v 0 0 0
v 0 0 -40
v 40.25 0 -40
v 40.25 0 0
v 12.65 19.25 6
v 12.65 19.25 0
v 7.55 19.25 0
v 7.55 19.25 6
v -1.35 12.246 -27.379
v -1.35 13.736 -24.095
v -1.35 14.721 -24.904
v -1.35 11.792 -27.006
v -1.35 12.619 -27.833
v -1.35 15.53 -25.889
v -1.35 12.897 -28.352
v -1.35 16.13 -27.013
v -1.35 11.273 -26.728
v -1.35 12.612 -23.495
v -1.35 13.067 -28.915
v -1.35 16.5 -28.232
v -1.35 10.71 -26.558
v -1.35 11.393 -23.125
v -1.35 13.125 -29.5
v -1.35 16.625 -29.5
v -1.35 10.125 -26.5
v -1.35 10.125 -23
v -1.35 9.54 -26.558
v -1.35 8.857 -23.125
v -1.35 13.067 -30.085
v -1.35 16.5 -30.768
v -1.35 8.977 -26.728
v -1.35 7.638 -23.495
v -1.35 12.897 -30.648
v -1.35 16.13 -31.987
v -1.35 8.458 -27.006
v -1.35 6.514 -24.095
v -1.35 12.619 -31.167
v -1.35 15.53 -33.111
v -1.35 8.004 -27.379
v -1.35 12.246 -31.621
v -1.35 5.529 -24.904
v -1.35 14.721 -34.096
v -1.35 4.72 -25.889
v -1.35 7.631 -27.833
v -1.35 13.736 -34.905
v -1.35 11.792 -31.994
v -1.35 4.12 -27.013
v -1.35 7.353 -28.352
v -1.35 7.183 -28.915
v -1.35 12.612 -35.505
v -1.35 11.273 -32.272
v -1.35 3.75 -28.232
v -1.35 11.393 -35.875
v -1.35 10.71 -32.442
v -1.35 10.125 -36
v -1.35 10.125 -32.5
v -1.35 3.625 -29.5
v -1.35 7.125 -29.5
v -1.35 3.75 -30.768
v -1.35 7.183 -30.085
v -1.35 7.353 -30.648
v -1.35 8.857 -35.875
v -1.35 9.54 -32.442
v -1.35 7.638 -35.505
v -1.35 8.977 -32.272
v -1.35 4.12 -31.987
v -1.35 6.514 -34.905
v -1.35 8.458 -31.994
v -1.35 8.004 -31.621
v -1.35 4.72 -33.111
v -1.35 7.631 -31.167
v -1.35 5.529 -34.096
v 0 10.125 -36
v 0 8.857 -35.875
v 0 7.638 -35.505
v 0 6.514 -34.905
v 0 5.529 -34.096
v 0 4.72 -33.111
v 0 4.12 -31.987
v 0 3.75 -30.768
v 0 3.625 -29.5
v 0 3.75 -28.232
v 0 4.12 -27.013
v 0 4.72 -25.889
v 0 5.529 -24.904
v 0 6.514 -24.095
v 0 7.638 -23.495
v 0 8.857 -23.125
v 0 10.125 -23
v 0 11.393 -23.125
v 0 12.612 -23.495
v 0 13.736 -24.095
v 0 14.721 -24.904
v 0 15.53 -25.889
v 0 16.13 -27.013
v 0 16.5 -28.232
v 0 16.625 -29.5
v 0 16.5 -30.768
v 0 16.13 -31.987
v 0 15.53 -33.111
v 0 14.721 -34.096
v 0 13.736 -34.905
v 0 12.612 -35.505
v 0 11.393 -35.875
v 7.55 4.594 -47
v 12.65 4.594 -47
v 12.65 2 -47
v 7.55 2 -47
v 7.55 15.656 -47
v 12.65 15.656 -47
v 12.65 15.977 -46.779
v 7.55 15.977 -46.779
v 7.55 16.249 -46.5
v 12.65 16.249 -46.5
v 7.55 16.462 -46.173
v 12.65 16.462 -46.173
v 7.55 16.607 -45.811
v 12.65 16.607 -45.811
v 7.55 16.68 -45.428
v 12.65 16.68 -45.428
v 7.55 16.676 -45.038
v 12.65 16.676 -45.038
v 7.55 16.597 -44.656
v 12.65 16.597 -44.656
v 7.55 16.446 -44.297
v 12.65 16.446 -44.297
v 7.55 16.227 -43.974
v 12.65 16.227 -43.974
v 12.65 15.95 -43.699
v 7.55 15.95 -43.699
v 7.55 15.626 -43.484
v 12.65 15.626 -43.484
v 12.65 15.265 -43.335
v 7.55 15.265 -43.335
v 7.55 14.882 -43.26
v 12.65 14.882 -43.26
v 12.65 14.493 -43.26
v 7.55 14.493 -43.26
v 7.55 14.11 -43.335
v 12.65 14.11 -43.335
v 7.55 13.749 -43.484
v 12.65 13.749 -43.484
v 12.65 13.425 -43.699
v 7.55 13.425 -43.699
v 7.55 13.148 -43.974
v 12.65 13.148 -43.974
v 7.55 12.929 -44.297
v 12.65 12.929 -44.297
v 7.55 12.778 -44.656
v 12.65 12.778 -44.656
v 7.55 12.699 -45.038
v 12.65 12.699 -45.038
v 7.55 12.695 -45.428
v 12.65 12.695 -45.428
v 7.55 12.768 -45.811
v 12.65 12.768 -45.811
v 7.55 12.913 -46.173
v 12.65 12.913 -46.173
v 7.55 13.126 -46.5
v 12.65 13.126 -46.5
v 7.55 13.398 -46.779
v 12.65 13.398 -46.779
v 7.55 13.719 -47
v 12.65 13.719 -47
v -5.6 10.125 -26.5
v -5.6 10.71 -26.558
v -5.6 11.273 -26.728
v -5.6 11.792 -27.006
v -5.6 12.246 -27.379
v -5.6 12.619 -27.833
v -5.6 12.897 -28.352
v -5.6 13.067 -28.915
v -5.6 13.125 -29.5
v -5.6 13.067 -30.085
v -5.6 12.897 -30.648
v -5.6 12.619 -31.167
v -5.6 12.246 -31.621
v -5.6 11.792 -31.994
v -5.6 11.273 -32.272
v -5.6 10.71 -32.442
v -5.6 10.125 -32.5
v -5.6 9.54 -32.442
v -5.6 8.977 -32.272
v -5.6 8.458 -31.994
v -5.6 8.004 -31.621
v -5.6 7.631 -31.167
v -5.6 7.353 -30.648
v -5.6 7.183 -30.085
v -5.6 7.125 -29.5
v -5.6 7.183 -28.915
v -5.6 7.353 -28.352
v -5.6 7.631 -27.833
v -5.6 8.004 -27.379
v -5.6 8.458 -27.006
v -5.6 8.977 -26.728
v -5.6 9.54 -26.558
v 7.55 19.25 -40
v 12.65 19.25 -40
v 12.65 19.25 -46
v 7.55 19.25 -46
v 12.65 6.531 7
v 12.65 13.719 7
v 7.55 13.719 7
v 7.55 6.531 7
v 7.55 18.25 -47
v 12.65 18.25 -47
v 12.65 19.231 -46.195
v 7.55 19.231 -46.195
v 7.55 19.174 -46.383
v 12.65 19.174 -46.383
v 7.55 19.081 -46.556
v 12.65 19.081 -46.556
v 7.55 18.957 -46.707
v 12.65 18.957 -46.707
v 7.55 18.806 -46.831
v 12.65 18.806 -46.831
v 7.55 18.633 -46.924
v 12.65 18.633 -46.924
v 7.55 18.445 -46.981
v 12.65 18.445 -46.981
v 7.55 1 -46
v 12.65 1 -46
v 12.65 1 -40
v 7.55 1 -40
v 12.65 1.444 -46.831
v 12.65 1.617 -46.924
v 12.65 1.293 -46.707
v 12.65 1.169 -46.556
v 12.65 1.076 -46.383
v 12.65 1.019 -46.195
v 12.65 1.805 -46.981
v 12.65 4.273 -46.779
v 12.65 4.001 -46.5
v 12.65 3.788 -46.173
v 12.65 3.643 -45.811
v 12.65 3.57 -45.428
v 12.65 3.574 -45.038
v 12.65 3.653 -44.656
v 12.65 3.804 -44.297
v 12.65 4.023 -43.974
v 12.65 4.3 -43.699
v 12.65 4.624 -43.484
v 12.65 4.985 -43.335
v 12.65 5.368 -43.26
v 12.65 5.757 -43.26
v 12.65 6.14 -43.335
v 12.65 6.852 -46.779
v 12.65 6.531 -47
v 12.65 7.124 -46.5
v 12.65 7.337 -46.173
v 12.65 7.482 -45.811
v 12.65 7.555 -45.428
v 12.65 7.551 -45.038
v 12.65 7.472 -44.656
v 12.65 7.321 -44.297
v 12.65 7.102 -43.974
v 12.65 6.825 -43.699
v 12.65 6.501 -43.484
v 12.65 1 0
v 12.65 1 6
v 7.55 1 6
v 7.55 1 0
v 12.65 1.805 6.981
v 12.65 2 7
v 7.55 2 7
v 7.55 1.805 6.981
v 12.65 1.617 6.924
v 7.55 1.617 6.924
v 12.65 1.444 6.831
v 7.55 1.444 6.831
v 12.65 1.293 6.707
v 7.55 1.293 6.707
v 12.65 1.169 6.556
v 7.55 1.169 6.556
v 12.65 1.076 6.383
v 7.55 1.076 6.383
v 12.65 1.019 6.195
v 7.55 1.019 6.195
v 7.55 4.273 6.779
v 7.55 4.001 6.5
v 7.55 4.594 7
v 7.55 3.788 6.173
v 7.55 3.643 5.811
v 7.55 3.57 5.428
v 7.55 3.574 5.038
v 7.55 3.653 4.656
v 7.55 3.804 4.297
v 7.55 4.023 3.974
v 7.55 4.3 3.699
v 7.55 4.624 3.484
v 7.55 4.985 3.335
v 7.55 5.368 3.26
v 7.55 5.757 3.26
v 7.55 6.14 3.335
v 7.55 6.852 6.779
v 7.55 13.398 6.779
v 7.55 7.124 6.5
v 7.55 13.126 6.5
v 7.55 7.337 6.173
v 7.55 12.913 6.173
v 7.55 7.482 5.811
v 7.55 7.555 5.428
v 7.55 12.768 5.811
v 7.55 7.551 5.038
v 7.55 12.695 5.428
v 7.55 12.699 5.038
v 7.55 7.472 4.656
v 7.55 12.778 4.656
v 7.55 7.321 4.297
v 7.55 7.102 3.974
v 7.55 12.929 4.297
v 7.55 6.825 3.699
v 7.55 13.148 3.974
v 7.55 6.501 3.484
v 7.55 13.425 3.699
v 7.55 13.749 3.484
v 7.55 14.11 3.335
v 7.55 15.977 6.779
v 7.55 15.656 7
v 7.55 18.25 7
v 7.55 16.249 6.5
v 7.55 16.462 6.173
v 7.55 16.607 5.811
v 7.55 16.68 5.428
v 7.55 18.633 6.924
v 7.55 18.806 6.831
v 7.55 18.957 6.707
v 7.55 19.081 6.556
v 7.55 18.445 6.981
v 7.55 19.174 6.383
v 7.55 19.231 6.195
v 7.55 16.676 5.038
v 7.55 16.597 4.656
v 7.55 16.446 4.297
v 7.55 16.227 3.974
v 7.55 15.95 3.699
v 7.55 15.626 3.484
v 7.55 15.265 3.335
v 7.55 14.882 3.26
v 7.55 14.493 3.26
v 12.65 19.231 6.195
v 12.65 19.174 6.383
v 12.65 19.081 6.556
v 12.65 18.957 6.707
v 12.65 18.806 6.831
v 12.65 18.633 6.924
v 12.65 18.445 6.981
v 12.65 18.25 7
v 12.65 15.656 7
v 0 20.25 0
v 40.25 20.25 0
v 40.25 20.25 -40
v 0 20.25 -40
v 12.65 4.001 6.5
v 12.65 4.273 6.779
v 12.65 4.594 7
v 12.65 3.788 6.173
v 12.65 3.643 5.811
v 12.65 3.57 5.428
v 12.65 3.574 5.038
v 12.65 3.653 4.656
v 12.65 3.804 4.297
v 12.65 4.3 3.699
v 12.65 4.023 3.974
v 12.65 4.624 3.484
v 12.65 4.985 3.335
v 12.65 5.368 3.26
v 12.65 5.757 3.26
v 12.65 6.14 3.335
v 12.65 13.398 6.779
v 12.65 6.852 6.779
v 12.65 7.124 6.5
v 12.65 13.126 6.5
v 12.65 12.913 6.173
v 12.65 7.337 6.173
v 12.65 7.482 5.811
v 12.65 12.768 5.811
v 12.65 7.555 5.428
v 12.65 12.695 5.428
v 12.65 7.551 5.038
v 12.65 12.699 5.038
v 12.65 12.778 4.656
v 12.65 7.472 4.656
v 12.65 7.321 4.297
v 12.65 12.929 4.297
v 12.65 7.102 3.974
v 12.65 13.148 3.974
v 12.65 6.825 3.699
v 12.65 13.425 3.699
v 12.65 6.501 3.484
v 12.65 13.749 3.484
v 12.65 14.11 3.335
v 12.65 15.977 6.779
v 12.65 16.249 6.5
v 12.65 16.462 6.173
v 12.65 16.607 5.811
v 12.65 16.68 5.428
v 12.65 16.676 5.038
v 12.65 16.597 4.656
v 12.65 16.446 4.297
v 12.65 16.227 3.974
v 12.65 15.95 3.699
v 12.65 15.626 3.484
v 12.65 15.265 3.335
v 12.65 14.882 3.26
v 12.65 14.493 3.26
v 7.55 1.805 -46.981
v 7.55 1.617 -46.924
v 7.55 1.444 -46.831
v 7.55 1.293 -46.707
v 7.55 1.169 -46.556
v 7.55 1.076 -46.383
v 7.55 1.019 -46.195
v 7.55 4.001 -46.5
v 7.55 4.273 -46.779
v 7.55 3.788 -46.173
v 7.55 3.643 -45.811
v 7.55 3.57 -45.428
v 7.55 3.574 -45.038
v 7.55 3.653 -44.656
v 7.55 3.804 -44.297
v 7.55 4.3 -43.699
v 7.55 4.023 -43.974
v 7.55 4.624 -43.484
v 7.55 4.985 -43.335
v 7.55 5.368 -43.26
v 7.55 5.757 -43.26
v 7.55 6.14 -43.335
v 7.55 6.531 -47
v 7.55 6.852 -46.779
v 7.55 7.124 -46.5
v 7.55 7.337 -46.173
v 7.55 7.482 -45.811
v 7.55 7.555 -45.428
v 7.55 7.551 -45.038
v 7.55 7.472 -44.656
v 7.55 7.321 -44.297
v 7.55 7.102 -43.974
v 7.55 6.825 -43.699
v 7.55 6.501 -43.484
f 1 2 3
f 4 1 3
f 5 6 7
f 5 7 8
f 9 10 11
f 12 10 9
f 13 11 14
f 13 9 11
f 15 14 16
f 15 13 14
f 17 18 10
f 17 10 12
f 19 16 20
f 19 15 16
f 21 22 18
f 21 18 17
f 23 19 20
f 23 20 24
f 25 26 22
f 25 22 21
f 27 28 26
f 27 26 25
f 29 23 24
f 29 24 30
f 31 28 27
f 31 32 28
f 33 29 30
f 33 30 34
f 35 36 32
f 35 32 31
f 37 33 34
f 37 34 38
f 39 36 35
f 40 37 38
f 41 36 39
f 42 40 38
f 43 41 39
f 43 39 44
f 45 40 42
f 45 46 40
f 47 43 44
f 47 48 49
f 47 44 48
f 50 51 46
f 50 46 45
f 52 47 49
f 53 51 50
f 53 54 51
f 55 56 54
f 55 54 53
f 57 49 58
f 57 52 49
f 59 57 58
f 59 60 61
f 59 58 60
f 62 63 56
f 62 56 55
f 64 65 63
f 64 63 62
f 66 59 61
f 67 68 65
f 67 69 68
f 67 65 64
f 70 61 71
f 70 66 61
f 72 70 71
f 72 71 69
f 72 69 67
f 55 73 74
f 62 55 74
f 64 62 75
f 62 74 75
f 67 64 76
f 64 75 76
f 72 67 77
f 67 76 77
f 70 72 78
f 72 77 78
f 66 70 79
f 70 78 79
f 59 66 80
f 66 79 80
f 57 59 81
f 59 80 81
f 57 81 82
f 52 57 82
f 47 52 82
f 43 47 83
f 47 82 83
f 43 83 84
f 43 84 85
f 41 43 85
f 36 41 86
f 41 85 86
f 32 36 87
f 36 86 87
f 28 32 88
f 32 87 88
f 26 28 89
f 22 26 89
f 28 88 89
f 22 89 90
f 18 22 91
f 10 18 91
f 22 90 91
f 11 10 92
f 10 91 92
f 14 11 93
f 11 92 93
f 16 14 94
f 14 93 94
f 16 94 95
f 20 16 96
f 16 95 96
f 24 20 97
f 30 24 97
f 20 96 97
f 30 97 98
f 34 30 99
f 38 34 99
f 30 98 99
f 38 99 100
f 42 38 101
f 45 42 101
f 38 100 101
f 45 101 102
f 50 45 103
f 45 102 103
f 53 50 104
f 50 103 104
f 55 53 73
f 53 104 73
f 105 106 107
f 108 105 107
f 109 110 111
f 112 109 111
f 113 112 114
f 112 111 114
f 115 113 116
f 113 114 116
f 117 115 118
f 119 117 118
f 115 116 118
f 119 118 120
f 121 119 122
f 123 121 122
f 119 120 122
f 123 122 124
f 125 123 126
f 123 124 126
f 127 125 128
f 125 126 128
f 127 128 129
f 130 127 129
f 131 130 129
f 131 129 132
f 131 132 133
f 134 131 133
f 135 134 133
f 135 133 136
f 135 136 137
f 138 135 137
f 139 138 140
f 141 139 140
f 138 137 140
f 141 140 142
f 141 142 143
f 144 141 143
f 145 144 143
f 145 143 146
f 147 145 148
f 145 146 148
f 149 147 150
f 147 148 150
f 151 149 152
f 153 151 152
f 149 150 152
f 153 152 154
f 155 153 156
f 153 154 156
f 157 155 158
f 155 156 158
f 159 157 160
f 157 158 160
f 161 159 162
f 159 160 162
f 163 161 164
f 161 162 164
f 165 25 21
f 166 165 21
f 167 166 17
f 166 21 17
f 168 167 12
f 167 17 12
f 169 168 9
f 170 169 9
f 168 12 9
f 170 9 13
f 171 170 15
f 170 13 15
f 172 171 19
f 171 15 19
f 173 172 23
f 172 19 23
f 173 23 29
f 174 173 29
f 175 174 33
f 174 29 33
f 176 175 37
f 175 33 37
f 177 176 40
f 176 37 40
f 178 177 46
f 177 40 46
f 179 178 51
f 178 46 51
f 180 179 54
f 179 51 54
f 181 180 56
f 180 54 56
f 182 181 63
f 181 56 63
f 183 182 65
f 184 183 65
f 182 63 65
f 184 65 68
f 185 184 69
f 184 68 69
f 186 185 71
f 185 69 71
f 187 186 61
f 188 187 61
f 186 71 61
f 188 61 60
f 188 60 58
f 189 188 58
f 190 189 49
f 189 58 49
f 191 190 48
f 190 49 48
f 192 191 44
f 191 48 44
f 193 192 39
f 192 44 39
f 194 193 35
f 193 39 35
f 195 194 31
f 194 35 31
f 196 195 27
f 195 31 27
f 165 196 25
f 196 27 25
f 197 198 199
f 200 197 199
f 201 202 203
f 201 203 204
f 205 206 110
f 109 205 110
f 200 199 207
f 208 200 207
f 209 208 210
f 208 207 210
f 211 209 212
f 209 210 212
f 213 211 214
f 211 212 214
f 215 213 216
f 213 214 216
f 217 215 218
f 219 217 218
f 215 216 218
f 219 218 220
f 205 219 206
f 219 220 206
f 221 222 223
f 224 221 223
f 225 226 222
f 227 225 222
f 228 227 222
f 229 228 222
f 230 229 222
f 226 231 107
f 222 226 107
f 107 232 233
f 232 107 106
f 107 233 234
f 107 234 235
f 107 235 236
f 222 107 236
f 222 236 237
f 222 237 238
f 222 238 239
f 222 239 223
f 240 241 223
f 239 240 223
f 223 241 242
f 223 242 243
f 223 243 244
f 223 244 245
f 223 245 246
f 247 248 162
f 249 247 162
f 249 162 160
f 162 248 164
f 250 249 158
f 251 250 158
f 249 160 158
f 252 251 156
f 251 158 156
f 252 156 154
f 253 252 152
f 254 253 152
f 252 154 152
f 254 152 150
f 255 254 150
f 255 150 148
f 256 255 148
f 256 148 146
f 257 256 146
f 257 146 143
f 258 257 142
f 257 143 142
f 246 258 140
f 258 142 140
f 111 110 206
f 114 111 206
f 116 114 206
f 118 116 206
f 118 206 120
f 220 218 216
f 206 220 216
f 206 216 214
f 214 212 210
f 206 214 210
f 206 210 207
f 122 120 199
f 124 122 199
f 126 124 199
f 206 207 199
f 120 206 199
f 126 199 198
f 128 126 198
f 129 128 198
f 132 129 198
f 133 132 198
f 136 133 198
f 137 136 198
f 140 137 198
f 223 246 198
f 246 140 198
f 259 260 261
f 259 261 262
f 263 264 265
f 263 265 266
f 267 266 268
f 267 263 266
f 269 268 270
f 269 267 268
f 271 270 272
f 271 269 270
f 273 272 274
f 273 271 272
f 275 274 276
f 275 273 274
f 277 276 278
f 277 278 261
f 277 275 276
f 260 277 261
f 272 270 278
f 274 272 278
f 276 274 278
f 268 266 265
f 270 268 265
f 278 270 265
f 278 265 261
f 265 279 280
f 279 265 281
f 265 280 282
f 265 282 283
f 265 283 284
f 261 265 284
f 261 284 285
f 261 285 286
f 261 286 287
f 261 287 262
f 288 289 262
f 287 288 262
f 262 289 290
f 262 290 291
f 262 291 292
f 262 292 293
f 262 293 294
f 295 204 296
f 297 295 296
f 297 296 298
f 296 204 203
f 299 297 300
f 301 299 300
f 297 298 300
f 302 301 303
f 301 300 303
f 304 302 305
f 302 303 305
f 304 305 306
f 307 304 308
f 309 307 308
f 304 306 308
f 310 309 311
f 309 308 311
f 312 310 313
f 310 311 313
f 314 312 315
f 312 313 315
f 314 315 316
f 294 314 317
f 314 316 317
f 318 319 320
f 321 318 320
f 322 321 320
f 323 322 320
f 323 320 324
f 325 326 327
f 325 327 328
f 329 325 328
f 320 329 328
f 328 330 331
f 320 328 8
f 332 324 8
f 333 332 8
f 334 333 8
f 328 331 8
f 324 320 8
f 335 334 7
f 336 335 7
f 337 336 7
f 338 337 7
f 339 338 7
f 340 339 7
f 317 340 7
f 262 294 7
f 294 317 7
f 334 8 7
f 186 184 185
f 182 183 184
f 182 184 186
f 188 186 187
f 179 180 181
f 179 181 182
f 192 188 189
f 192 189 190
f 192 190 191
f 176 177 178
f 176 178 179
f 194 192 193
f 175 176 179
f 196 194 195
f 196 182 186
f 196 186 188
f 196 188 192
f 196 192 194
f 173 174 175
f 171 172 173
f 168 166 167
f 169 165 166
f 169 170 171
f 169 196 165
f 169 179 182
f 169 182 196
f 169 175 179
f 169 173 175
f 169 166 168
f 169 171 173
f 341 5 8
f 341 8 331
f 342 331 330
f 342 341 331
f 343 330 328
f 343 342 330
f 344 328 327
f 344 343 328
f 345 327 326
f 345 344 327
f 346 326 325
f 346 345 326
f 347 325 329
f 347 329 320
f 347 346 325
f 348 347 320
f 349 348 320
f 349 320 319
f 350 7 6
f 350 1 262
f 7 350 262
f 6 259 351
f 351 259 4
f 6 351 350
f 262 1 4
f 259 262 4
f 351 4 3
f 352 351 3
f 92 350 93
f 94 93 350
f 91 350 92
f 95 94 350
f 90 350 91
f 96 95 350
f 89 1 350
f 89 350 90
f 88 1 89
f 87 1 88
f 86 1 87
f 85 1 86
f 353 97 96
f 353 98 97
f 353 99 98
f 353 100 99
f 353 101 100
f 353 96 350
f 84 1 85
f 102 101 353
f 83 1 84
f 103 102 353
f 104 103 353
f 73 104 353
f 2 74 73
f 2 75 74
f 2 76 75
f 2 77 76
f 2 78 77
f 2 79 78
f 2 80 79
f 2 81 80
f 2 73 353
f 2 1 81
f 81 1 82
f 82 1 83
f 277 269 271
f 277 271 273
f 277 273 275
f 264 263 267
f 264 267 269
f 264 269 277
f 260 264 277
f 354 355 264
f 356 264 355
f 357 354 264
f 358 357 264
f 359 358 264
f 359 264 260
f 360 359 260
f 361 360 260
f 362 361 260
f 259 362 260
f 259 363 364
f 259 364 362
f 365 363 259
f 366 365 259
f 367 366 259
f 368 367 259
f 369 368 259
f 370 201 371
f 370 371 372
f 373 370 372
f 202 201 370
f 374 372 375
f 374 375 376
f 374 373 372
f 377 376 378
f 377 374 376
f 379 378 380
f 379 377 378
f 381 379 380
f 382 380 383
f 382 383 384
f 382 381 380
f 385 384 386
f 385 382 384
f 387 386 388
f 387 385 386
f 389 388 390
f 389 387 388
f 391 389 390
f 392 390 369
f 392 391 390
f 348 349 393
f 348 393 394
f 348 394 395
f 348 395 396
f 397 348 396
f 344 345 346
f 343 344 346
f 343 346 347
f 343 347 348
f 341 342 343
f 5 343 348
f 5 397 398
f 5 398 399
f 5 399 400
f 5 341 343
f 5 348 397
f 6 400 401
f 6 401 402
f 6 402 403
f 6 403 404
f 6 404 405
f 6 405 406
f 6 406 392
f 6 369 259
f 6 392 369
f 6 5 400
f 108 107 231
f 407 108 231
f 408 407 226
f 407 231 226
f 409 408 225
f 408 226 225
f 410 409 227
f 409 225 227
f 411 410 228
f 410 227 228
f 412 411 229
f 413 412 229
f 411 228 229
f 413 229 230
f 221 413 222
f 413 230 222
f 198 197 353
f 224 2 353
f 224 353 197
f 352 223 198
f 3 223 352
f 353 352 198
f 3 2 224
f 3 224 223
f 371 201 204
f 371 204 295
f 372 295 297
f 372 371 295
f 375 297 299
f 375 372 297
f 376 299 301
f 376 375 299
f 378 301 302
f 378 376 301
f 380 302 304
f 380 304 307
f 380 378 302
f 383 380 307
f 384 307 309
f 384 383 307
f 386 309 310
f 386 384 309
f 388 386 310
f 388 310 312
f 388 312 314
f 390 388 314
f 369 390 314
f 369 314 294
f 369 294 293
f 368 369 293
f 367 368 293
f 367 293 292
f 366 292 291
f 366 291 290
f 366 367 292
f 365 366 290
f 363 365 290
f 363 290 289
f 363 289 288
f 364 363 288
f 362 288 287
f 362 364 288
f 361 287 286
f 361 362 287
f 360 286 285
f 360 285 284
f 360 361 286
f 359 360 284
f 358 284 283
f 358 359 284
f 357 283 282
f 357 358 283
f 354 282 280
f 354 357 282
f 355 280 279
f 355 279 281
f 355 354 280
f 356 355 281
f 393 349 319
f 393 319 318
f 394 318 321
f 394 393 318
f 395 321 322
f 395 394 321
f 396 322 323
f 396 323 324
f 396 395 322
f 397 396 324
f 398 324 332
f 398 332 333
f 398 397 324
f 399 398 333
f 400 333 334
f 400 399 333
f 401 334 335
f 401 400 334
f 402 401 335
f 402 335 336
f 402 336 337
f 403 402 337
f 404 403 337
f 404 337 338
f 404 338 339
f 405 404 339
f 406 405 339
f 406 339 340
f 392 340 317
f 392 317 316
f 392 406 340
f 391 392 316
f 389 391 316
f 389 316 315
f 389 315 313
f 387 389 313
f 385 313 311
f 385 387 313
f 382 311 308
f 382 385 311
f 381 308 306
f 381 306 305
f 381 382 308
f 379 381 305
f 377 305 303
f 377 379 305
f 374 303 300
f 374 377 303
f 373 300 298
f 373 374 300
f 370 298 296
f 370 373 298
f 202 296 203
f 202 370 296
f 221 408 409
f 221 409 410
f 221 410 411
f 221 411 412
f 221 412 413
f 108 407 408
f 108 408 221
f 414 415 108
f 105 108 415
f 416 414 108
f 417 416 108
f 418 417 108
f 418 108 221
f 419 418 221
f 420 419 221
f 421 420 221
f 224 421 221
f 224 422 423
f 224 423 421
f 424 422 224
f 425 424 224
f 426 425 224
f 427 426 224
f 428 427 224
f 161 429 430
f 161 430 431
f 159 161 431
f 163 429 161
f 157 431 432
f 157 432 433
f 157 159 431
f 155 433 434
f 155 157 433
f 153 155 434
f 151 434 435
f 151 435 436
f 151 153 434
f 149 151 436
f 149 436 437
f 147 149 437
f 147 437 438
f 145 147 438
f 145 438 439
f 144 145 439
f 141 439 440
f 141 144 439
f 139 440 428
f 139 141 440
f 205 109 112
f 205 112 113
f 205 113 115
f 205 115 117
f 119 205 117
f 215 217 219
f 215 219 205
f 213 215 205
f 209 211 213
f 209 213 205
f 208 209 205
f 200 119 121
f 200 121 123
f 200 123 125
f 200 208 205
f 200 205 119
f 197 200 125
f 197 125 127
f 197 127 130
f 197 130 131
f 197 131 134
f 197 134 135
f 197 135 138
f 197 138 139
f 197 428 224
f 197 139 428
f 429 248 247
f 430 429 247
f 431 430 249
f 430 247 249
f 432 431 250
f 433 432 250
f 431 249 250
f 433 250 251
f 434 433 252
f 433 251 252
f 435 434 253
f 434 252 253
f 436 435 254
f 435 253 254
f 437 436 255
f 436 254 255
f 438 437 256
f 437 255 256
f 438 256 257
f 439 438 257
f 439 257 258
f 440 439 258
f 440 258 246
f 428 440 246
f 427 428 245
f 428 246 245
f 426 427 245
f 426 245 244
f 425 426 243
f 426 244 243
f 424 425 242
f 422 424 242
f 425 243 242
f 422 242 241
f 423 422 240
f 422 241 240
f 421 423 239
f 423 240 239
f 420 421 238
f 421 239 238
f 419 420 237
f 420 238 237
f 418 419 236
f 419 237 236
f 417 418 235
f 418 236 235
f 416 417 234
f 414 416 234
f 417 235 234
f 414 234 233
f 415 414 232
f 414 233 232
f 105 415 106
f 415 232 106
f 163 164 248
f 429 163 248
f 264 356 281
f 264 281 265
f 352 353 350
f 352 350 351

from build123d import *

# Parameters (mm, degrees)
SKETCH1_W           = 40.25
SKETCH1_H           = 40
BOSS_EXTRUDE1_DEPTH = 20.25
SKETCH2_R           = 6.5
BOSS_EXTRUDE2_DEPTH = 1.35
SKETCH3_R           = 3
BOSS_EXTRUDE3_DEPTH = 4.25
BOSS_EXTRUDE4_DEPTH = 5.1


with BuildPart() as part:
    # Sketch1 → Boss-Extrude1 (new body)
    with BuildSketch(Plane(origin=(0, 0, 0), x_dir=(1, 0, 0), z_dir=(0, 1, 0))):
        with Locations((20.125, 20)):
            Rectangle(SKETCH1_W, SKETCH1_H)
    extrude(amount=BOSS_EXTRUDE1_DEPTH)

    # Sketch2 → Boss-Extrude2 (add)
    with BuildSketch(Plane.ZY):
        with Locations(Location((-29.5, 10.125, 0), (0, 0, 180))):
            Circle(SKETCH2_R)
    extrude(amount=BOSS_EXTRUDE2_DEPTH)

    # Sketch3 → Boss-Extrude3 (add)
    with BuildSketch(Plane.ZY.offset(1.35)):
        with Locations((-29.5, 10.125)):
            Circle(SKETCH3_R)
    extrude(amount=BOSS_EXTRUDE3_DEPTH)

    # Sketch4 → Boss-Extrude4 (add)
    with BuildSketch(Plane(origin=(12.65, 0, 0), x_dir=(0, 0, -1), z_dir=(1, 0, 0))):
        with BuildLine():
            Line((40, 19.25), (46, 19.25))
            ThreePointArc((46, 19.25), (46.707106781, 18.957106781), (47, 18.25))
            Line((47, 18.25), (47, 15.655745837))
            ThreePointArc((47, 15.655745837), (43.25, 14.6875), (47, 13.719254163))
            Line((47, 13.719254163), (47, 6.530745837))
            ThreePointArc((47, 6.530745837), (43.25, 5.5625), (47, 4.594254163))
            Line((47, 4.594254163), (47, 2))
            ThreePointArc((47, 2), (46.707106781, 1.292893219), (46, 1))
            Line((46, 1), (40, 1))
            Line((40, 1), (40, 19.25))
        make_face()
        with BuildLine():
            Line((0, 19.25), (-6, 19.25))
            ThreePointArc((-6, 19.25), (-6.707106781, 18.957106781), (-7, 18.25))
            Line((-7, 18.25), (-7, 15.655745837))
            ThreePointArc((-7, 15.655745837), (-3.25, 14.6875), (-7, 13.719254163))
            Line((-7, 13.719254163), (-7, 6.530745837))
            ThreePointArc((-7, 6.530745837), (-3.25, 5.5625), (-7, 4.594254163))
            Line((-7, 4.594254163), (-7, 2))
            ThreePointArc((-7, 2), (-6.707106781, 1.292893219), (-6, 1))
            Line((-6, 1), (0, 1))
            Line((0, 1), (0, 19.25))
        make_face()
    extrude(amount=-BOSS_EXTRUDE4_DEPTH)


solid = part.part
